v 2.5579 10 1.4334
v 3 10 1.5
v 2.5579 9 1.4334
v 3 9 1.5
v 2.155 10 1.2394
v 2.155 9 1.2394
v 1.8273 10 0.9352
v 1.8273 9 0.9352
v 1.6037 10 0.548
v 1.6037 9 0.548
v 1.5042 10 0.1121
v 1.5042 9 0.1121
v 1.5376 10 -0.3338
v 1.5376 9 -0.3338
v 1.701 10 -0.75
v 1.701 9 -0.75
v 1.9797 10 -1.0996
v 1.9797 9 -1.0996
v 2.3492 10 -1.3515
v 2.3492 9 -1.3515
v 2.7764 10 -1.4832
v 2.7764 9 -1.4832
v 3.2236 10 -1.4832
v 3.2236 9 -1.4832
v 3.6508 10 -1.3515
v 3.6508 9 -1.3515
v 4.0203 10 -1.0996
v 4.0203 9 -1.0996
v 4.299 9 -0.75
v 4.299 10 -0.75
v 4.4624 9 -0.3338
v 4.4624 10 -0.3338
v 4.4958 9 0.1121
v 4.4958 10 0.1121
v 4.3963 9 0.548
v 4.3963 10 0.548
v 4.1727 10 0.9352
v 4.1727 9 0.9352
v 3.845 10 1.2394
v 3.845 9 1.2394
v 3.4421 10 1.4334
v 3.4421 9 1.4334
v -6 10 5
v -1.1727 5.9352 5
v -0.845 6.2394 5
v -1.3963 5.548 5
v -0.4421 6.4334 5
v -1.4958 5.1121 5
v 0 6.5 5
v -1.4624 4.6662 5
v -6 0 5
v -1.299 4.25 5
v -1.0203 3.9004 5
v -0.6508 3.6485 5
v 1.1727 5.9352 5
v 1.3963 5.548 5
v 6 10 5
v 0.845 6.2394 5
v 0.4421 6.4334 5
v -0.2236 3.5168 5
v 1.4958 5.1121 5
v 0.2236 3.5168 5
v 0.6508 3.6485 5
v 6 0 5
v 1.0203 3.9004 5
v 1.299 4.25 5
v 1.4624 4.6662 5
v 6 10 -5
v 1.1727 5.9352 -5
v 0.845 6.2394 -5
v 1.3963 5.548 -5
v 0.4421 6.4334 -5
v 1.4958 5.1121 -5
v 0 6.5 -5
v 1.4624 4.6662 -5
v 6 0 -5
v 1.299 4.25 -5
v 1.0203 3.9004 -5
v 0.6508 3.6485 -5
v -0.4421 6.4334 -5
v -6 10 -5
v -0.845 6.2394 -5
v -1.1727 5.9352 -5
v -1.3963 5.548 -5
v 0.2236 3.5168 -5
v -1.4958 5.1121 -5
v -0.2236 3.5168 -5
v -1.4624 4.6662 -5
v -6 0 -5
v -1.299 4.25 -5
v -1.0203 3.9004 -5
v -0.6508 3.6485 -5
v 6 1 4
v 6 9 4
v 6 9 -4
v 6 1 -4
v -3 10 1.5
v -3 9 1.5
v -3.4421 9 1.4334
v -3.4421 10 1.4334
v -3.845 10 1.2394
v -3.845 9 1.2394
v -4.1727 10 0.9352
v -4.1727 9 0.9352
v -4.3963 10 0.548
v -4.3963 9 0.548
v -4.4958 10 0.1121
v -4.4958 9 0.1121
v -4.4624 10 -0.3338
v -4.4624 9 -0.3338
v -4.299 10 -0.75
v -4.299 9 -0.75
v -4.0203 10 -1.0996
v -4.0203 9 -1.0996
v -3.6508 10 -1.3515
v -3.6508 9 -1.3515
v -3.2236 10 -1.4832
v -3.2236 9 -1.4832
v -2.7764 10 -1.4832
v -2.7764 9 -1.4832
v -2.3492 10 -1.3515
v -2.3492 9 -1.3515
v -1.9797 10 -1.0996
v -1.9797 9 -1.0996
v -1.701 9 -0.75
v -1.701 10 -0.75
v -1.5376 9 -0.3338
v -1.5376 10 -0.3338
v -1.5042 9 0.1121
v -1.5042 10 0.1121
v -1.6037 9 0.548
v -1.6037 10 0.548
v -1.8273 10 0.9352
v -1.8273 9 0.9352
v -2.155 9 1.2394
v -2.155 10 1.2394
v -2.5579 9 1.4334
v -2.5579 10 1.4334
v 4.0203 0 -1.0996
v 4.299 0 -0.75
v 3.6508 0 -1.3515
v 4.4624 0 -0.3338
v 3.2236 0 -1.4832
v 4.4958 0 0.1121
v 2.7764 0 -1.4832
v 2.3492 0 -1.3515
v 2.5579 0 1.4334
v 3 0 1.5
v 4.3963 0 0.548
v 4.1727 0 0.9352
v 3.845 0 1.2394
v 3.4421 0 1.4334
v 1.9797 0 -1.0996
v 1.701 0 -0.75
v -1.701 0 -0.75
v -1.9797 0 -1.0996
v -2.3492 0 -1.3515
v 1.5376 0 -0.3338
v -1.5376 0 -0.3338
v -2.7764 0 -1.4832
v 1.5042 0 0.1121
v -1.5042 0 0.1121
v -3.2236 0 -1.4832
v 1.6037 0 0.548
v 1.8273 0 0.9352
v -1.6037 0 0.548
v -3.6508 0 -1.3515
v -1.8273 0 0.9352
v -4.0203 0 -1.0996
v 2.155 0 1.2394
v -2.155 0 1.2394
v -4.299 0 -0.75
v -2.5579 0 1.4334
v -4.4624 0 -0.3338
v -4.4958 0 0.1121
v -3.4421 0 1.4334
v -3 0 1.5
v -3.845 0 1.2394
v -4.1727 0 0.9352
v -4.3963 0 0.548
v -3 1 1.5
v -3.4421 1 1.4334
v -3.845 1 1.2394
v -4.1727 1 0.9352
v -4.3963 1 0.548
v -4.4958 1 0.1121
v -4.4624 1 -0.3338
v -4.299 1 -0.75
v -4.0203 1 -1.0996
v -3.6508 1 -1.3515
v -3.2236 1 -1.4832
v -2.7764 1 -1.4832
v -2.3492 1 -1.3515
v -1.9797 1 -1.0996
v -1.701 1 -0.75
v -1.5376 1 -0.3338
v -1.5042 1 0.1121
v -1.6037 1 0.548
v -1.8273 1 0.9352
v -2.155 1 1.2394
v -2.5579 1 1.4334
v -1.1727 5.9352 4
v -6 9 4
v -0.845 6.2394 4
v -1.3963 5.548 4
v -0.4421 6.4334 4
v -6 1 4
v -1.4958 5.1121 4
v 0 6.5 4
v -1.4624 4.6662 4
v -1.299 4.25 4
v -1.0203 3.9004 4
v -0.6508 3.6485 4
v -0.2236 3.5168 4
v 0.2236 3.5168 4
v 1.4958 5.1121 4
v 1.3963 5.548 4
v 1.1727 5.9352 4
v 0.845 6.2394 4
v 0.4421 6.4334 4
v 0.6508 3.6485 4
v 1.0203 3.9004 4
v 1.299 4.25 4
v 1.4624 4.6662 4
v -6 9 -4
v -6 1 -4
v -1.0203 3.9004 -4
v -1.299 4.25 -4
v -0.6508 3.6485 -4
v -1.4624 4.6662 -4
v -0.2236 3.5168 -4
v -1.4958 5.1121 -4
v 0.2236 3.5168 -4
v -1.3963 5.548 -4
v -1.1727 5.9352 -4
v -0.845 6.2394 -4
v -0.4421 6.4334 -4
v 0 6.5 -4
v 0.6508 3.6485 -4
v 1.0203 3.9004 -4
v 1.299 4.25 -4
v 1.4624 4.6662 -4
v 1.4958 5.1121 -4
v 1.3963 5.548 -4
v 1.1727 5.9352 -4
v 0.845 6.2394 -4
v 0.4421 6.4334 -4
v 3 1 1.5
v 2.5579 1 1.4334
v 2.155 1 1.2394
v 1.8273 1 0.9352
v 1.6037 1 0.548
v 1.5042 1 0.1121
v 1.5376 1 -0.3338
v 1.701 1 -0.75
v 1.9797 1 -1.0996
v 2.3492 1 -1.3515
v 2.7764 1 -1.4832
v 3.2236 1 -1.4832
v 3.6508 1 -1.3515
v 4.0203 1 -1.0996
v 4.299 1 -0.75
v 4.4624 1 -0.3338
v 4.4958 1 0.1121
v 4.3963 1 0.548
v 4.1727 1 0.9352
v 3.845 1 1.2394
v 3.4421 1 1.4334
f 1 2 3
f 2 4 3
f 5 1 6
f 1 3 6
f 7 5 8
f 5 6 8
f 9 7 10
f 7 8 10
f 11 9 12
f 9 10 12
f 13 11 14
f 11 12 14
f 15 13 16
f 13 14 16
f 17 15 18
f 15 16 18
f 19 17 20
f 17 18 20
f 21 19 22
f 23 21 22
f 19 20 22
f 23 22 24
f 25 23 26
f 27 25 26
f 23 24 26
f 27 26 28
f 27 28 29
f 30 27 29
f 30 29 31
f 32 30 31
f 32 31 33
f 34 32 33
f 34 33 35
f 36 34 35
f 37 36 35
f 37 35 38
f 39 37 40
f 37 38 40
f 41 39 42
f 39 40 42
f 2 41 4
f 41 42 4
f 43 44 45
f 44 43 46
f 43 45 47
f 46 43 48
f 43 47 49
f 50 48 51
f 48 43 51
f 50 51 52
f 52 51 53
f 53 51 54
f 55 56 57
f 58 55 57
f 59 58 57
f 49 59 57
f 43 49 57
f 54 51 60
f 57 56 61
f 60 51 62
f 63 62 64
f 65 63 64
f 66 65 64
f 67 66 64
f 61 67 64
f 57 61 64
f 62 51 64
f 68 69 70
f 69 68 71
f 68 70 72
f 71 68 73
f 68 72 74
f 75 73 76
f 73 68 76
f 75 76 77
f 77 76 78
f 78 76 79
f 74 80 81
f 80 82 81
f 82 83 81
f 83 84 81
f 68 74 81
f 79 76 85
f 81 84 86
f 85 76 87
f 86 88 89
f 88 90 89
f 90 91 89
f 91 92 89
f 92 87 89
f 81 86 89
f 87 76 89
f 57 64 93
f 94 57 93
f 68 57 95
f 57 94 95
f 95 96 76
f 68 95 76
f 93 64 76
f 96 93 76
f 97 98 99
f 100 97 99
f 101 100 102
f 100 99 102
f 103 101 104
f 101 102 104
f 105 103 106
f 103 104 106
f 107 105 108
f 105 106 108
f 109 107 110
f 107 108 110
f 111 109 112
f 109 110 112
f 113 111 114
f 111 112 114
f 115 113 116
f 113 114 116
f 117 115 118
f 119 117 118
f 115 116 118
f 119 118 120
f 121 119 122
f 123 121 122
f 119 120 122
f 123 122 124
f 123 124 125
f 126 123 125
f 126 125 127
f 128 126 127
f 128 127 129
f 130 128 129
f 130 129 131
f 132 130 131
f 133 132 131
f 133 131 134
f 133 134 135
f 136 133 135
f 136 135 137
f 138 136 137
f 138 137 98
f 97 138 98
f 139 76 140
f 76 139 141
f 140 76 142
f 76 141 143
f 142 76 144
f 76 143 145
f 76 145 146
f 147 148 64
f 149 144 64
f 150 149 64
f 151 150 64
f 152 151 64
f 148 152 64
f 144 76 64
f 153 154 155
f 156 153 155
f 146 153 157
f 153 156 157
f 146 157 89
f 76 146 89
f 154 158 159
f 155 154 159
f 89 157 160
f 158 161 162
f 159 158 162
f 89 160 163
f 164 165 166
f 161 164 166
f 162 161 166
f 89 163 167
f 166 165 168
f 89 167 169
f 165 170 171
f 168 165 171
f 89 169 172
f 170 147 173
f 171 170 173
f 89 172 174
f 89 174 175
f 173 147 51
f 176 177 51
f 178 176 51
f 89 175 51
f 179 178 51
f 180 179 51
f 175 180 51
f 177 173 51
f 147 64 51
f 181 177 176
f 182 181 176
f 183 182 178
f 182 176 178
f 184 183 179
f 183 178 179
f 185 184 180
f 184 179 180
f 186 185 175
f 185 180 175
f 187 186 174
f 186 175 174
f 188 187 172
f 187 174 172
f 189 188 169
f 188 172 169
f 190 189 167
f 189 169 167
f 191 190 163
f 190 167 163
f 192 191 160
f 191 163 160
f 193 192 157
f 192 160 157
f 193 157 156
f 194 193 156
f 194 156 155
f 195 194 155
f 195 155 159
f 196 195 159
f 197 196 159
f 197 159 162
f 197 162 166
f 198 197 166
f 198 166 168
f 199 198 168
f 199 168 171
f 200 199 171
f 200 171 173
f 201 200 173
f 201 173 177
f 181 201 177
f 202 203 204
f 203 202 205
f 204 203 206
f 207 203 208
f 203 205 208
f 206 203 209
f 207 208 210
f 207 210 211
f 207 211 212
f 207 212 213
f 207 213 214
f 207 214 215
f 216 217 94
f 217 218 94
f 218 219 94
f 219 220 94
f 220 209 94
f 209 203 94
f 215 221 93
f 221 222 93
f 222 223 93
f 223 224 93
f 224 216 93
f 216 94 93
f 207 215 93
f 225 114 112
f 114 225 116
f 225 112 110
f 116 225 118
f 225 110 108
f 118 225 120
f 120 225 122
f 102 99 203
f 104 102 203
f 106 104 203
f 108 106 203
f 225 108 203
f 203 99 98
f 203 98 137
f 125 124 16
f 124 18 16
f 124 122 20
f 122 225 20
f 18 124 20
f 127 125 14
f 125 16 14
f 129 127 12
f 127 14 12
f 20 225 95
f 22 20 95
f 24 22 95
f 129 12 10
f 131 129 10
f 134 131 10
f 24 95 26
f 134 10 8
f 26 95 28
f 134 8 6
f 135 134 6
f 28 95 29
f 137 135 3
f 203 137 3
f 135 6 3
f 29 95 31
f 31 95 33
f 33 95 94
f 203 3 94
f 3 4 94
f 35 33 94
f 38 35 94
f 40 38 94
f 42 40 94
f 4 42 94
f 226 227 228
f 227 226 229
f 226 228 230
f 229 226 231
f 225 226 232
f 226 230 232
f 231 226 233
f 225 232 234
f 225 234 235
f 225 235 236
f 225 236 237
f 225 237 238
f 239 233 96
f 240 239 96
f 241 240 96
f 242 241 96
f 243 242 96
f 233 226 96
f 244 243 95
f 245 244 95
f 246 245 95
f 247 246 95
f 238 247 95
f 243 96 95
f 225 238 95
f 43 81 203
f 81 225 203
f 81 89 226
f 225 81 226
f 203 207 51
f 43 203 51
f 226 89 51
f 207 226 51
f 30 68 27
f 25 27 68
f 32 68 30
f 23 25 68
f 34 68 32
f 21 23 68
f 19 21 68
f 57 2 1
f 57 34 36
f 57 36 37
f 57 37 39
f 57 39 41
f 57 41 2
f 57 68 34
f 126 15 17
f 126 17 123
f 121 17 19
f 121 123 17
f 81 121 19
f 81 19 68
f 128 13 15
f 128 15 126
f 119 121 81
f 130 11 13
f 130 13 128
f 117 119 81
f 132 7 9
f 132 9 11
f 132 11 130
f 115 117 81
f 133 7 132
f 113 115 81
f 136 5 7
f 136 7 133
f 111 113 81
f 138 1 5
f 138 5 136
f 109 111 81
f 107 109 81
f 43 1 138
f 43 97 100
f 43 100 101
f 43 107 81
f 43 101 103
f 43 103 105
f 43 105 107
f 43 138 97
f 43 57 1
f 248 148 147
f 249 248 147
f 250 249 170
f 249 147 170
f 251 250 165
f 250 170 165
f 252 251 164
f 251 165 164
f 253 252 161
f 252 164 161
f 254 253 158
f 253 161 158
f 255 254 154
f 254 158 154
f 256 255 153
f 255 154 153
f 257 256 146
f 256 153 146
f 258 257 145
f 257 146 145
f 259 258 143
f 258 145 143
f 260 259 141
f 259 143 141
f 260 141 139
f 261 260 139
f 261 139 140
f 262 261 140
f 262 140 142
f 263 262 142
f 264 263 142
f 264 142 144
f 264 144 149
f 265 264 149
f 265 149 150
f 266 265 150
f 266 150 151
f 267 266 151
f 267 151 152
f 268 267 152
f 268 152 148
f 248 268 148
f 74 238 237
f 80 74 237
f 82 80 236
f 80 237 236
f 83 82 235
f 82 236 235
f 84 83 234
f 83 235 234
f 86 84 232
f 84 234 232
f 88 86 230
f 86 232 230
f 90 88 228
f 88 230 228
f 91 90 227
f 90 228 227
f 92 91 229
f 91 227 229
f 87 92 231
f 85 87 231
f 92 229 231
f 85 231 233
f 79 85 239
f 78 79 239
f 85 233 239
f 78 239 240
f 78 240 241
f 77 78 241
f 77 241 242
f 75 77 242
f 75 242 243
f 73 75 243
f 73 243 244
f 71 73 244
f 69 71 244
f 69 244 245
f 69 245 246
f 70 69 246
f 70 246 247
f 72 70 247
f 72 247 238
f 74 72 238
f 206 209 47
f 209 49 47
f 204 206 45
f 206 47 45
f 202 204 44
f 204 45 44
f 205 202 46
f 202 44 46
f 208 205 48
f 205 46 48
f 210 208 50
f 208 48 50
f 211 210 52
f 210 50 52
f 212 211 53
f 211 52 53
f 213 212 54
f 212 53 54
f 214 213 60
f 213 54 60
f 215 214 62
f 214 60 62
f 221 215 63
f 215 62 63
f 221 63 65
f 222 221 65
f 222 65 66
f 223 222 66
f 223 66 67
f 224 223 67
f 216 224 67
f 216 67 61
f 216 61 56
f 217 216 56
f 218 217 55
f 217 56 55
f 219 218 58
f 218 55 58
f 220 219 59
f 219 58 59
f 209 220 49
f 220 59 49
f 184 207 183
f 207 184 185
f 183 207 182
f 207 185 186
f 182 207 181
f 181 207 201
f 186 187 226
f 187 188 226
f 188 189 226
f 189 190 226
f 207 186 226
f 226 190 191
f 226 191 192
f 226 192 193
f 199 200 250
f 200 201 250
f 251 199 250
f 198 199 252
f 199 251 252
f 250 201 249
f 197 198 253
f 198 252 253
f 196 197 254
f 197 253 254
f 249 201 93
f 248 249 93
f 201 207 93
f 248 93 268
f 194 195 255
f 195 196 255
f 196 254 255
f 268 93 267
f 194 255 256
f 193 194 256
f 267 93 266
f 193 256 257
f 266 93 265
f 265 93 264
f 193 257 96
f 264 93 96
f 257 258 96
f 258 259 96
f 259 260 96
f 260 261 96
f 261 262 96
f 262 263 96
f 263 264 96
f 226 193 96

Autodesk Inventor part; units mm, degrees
ref_plane "YZ Plane" through (0, 0, 0) normal (1, 0, 0) x (0, 1, 0)
ref_plane "XZ Plane" through (0, 0, 0) normal (0, 1, 0) x (-1, 0, 0)
ref_plane "XY Plane" through (0, 0, 0) normal (0, 0, 1) x (1, 0, 0)
sketch "スケッチ1" plane through (0, 0, 0) normal (0, 1, 0) x (-1, 0, 0)
  line L0 (-6, -5) -> (6, -5)
  line L1 (6, -5) -> (6, 5)
  line L2 (6, 5) -> (-6, 5)
  line L3 (-6, 5) -> (-6, -5)
  line L4 (-6, -5) -> (6, 5) construction
  line L5 (6, -5) -> (-6, 5) construction
  point P0 (0, 0)
  dimension "d0" = 12
  dimension "d1" = 10
extrude "押し出し1" add sketch "スケッチ1" along normal blind 10
sketch "スケッチ3" plane through (0, 10, 0) normal (0, 1, 0) x (1, 0, 0)
  line L0 (6, -5) -> (6, 5) projected
  line L1 (-6, 5) -> (-6, -5) projected
  point P0 (0, 0)
  point P1 (3, 0)
  point P2 (-3, 0)
  point P3 (-6, 0)
  dimension "d4" = 3
  dimension "d12" = 3
hole "穴1" at (3, 10, 0) at (-3, 10, 0) direction (0, -1, 0) diameter 3 end through all
sketch "スケッチ4" plane through (6, 0, -5) normal (0, 0, -1) x (-1, 0, 0)
  line L0 (0, 0) -> (12, 0) projected
  line L1 (12, 0) -> (12, 10) projected
  point P0 (6, 0)
  point P1 (6, 5)
  point P2 (6, 0)
  point P3 (12, 5)
hole "穴2" at (0, 5, -5) direction (0, 0, 1) diameter 3 end through all
sketch "スケッチ5" plane through (6, 0, 5) normal (1, 0, 0) x (0, 0, -1)
  line L0 (1, 1) -> (9, 1)
  line L1 (9, 1) -> (9, 9)
  line L2 (9, 9) -> (1, 9)
  line L3 (1, 9) -> (1, 1)
  line L4 (1, 1) -> (9, 9) construction
  line L5 (9, 1) -> (1, 9) construction
  line L6 (10, 0) -> (10, 10) projected
  point P0 (5, 0)
  point P1 (5, 5)
  point P2 (5, 5)
  point P3 (5, 5)
  point P4 (10, 5)
  dimension "d20" = 8
  dimension "d21" = 8
extrude "押し出し2" cut sketch "スケッチ5" against normal blind 12
properties part number "sensor_attach" material "アルミニウム 6061"
